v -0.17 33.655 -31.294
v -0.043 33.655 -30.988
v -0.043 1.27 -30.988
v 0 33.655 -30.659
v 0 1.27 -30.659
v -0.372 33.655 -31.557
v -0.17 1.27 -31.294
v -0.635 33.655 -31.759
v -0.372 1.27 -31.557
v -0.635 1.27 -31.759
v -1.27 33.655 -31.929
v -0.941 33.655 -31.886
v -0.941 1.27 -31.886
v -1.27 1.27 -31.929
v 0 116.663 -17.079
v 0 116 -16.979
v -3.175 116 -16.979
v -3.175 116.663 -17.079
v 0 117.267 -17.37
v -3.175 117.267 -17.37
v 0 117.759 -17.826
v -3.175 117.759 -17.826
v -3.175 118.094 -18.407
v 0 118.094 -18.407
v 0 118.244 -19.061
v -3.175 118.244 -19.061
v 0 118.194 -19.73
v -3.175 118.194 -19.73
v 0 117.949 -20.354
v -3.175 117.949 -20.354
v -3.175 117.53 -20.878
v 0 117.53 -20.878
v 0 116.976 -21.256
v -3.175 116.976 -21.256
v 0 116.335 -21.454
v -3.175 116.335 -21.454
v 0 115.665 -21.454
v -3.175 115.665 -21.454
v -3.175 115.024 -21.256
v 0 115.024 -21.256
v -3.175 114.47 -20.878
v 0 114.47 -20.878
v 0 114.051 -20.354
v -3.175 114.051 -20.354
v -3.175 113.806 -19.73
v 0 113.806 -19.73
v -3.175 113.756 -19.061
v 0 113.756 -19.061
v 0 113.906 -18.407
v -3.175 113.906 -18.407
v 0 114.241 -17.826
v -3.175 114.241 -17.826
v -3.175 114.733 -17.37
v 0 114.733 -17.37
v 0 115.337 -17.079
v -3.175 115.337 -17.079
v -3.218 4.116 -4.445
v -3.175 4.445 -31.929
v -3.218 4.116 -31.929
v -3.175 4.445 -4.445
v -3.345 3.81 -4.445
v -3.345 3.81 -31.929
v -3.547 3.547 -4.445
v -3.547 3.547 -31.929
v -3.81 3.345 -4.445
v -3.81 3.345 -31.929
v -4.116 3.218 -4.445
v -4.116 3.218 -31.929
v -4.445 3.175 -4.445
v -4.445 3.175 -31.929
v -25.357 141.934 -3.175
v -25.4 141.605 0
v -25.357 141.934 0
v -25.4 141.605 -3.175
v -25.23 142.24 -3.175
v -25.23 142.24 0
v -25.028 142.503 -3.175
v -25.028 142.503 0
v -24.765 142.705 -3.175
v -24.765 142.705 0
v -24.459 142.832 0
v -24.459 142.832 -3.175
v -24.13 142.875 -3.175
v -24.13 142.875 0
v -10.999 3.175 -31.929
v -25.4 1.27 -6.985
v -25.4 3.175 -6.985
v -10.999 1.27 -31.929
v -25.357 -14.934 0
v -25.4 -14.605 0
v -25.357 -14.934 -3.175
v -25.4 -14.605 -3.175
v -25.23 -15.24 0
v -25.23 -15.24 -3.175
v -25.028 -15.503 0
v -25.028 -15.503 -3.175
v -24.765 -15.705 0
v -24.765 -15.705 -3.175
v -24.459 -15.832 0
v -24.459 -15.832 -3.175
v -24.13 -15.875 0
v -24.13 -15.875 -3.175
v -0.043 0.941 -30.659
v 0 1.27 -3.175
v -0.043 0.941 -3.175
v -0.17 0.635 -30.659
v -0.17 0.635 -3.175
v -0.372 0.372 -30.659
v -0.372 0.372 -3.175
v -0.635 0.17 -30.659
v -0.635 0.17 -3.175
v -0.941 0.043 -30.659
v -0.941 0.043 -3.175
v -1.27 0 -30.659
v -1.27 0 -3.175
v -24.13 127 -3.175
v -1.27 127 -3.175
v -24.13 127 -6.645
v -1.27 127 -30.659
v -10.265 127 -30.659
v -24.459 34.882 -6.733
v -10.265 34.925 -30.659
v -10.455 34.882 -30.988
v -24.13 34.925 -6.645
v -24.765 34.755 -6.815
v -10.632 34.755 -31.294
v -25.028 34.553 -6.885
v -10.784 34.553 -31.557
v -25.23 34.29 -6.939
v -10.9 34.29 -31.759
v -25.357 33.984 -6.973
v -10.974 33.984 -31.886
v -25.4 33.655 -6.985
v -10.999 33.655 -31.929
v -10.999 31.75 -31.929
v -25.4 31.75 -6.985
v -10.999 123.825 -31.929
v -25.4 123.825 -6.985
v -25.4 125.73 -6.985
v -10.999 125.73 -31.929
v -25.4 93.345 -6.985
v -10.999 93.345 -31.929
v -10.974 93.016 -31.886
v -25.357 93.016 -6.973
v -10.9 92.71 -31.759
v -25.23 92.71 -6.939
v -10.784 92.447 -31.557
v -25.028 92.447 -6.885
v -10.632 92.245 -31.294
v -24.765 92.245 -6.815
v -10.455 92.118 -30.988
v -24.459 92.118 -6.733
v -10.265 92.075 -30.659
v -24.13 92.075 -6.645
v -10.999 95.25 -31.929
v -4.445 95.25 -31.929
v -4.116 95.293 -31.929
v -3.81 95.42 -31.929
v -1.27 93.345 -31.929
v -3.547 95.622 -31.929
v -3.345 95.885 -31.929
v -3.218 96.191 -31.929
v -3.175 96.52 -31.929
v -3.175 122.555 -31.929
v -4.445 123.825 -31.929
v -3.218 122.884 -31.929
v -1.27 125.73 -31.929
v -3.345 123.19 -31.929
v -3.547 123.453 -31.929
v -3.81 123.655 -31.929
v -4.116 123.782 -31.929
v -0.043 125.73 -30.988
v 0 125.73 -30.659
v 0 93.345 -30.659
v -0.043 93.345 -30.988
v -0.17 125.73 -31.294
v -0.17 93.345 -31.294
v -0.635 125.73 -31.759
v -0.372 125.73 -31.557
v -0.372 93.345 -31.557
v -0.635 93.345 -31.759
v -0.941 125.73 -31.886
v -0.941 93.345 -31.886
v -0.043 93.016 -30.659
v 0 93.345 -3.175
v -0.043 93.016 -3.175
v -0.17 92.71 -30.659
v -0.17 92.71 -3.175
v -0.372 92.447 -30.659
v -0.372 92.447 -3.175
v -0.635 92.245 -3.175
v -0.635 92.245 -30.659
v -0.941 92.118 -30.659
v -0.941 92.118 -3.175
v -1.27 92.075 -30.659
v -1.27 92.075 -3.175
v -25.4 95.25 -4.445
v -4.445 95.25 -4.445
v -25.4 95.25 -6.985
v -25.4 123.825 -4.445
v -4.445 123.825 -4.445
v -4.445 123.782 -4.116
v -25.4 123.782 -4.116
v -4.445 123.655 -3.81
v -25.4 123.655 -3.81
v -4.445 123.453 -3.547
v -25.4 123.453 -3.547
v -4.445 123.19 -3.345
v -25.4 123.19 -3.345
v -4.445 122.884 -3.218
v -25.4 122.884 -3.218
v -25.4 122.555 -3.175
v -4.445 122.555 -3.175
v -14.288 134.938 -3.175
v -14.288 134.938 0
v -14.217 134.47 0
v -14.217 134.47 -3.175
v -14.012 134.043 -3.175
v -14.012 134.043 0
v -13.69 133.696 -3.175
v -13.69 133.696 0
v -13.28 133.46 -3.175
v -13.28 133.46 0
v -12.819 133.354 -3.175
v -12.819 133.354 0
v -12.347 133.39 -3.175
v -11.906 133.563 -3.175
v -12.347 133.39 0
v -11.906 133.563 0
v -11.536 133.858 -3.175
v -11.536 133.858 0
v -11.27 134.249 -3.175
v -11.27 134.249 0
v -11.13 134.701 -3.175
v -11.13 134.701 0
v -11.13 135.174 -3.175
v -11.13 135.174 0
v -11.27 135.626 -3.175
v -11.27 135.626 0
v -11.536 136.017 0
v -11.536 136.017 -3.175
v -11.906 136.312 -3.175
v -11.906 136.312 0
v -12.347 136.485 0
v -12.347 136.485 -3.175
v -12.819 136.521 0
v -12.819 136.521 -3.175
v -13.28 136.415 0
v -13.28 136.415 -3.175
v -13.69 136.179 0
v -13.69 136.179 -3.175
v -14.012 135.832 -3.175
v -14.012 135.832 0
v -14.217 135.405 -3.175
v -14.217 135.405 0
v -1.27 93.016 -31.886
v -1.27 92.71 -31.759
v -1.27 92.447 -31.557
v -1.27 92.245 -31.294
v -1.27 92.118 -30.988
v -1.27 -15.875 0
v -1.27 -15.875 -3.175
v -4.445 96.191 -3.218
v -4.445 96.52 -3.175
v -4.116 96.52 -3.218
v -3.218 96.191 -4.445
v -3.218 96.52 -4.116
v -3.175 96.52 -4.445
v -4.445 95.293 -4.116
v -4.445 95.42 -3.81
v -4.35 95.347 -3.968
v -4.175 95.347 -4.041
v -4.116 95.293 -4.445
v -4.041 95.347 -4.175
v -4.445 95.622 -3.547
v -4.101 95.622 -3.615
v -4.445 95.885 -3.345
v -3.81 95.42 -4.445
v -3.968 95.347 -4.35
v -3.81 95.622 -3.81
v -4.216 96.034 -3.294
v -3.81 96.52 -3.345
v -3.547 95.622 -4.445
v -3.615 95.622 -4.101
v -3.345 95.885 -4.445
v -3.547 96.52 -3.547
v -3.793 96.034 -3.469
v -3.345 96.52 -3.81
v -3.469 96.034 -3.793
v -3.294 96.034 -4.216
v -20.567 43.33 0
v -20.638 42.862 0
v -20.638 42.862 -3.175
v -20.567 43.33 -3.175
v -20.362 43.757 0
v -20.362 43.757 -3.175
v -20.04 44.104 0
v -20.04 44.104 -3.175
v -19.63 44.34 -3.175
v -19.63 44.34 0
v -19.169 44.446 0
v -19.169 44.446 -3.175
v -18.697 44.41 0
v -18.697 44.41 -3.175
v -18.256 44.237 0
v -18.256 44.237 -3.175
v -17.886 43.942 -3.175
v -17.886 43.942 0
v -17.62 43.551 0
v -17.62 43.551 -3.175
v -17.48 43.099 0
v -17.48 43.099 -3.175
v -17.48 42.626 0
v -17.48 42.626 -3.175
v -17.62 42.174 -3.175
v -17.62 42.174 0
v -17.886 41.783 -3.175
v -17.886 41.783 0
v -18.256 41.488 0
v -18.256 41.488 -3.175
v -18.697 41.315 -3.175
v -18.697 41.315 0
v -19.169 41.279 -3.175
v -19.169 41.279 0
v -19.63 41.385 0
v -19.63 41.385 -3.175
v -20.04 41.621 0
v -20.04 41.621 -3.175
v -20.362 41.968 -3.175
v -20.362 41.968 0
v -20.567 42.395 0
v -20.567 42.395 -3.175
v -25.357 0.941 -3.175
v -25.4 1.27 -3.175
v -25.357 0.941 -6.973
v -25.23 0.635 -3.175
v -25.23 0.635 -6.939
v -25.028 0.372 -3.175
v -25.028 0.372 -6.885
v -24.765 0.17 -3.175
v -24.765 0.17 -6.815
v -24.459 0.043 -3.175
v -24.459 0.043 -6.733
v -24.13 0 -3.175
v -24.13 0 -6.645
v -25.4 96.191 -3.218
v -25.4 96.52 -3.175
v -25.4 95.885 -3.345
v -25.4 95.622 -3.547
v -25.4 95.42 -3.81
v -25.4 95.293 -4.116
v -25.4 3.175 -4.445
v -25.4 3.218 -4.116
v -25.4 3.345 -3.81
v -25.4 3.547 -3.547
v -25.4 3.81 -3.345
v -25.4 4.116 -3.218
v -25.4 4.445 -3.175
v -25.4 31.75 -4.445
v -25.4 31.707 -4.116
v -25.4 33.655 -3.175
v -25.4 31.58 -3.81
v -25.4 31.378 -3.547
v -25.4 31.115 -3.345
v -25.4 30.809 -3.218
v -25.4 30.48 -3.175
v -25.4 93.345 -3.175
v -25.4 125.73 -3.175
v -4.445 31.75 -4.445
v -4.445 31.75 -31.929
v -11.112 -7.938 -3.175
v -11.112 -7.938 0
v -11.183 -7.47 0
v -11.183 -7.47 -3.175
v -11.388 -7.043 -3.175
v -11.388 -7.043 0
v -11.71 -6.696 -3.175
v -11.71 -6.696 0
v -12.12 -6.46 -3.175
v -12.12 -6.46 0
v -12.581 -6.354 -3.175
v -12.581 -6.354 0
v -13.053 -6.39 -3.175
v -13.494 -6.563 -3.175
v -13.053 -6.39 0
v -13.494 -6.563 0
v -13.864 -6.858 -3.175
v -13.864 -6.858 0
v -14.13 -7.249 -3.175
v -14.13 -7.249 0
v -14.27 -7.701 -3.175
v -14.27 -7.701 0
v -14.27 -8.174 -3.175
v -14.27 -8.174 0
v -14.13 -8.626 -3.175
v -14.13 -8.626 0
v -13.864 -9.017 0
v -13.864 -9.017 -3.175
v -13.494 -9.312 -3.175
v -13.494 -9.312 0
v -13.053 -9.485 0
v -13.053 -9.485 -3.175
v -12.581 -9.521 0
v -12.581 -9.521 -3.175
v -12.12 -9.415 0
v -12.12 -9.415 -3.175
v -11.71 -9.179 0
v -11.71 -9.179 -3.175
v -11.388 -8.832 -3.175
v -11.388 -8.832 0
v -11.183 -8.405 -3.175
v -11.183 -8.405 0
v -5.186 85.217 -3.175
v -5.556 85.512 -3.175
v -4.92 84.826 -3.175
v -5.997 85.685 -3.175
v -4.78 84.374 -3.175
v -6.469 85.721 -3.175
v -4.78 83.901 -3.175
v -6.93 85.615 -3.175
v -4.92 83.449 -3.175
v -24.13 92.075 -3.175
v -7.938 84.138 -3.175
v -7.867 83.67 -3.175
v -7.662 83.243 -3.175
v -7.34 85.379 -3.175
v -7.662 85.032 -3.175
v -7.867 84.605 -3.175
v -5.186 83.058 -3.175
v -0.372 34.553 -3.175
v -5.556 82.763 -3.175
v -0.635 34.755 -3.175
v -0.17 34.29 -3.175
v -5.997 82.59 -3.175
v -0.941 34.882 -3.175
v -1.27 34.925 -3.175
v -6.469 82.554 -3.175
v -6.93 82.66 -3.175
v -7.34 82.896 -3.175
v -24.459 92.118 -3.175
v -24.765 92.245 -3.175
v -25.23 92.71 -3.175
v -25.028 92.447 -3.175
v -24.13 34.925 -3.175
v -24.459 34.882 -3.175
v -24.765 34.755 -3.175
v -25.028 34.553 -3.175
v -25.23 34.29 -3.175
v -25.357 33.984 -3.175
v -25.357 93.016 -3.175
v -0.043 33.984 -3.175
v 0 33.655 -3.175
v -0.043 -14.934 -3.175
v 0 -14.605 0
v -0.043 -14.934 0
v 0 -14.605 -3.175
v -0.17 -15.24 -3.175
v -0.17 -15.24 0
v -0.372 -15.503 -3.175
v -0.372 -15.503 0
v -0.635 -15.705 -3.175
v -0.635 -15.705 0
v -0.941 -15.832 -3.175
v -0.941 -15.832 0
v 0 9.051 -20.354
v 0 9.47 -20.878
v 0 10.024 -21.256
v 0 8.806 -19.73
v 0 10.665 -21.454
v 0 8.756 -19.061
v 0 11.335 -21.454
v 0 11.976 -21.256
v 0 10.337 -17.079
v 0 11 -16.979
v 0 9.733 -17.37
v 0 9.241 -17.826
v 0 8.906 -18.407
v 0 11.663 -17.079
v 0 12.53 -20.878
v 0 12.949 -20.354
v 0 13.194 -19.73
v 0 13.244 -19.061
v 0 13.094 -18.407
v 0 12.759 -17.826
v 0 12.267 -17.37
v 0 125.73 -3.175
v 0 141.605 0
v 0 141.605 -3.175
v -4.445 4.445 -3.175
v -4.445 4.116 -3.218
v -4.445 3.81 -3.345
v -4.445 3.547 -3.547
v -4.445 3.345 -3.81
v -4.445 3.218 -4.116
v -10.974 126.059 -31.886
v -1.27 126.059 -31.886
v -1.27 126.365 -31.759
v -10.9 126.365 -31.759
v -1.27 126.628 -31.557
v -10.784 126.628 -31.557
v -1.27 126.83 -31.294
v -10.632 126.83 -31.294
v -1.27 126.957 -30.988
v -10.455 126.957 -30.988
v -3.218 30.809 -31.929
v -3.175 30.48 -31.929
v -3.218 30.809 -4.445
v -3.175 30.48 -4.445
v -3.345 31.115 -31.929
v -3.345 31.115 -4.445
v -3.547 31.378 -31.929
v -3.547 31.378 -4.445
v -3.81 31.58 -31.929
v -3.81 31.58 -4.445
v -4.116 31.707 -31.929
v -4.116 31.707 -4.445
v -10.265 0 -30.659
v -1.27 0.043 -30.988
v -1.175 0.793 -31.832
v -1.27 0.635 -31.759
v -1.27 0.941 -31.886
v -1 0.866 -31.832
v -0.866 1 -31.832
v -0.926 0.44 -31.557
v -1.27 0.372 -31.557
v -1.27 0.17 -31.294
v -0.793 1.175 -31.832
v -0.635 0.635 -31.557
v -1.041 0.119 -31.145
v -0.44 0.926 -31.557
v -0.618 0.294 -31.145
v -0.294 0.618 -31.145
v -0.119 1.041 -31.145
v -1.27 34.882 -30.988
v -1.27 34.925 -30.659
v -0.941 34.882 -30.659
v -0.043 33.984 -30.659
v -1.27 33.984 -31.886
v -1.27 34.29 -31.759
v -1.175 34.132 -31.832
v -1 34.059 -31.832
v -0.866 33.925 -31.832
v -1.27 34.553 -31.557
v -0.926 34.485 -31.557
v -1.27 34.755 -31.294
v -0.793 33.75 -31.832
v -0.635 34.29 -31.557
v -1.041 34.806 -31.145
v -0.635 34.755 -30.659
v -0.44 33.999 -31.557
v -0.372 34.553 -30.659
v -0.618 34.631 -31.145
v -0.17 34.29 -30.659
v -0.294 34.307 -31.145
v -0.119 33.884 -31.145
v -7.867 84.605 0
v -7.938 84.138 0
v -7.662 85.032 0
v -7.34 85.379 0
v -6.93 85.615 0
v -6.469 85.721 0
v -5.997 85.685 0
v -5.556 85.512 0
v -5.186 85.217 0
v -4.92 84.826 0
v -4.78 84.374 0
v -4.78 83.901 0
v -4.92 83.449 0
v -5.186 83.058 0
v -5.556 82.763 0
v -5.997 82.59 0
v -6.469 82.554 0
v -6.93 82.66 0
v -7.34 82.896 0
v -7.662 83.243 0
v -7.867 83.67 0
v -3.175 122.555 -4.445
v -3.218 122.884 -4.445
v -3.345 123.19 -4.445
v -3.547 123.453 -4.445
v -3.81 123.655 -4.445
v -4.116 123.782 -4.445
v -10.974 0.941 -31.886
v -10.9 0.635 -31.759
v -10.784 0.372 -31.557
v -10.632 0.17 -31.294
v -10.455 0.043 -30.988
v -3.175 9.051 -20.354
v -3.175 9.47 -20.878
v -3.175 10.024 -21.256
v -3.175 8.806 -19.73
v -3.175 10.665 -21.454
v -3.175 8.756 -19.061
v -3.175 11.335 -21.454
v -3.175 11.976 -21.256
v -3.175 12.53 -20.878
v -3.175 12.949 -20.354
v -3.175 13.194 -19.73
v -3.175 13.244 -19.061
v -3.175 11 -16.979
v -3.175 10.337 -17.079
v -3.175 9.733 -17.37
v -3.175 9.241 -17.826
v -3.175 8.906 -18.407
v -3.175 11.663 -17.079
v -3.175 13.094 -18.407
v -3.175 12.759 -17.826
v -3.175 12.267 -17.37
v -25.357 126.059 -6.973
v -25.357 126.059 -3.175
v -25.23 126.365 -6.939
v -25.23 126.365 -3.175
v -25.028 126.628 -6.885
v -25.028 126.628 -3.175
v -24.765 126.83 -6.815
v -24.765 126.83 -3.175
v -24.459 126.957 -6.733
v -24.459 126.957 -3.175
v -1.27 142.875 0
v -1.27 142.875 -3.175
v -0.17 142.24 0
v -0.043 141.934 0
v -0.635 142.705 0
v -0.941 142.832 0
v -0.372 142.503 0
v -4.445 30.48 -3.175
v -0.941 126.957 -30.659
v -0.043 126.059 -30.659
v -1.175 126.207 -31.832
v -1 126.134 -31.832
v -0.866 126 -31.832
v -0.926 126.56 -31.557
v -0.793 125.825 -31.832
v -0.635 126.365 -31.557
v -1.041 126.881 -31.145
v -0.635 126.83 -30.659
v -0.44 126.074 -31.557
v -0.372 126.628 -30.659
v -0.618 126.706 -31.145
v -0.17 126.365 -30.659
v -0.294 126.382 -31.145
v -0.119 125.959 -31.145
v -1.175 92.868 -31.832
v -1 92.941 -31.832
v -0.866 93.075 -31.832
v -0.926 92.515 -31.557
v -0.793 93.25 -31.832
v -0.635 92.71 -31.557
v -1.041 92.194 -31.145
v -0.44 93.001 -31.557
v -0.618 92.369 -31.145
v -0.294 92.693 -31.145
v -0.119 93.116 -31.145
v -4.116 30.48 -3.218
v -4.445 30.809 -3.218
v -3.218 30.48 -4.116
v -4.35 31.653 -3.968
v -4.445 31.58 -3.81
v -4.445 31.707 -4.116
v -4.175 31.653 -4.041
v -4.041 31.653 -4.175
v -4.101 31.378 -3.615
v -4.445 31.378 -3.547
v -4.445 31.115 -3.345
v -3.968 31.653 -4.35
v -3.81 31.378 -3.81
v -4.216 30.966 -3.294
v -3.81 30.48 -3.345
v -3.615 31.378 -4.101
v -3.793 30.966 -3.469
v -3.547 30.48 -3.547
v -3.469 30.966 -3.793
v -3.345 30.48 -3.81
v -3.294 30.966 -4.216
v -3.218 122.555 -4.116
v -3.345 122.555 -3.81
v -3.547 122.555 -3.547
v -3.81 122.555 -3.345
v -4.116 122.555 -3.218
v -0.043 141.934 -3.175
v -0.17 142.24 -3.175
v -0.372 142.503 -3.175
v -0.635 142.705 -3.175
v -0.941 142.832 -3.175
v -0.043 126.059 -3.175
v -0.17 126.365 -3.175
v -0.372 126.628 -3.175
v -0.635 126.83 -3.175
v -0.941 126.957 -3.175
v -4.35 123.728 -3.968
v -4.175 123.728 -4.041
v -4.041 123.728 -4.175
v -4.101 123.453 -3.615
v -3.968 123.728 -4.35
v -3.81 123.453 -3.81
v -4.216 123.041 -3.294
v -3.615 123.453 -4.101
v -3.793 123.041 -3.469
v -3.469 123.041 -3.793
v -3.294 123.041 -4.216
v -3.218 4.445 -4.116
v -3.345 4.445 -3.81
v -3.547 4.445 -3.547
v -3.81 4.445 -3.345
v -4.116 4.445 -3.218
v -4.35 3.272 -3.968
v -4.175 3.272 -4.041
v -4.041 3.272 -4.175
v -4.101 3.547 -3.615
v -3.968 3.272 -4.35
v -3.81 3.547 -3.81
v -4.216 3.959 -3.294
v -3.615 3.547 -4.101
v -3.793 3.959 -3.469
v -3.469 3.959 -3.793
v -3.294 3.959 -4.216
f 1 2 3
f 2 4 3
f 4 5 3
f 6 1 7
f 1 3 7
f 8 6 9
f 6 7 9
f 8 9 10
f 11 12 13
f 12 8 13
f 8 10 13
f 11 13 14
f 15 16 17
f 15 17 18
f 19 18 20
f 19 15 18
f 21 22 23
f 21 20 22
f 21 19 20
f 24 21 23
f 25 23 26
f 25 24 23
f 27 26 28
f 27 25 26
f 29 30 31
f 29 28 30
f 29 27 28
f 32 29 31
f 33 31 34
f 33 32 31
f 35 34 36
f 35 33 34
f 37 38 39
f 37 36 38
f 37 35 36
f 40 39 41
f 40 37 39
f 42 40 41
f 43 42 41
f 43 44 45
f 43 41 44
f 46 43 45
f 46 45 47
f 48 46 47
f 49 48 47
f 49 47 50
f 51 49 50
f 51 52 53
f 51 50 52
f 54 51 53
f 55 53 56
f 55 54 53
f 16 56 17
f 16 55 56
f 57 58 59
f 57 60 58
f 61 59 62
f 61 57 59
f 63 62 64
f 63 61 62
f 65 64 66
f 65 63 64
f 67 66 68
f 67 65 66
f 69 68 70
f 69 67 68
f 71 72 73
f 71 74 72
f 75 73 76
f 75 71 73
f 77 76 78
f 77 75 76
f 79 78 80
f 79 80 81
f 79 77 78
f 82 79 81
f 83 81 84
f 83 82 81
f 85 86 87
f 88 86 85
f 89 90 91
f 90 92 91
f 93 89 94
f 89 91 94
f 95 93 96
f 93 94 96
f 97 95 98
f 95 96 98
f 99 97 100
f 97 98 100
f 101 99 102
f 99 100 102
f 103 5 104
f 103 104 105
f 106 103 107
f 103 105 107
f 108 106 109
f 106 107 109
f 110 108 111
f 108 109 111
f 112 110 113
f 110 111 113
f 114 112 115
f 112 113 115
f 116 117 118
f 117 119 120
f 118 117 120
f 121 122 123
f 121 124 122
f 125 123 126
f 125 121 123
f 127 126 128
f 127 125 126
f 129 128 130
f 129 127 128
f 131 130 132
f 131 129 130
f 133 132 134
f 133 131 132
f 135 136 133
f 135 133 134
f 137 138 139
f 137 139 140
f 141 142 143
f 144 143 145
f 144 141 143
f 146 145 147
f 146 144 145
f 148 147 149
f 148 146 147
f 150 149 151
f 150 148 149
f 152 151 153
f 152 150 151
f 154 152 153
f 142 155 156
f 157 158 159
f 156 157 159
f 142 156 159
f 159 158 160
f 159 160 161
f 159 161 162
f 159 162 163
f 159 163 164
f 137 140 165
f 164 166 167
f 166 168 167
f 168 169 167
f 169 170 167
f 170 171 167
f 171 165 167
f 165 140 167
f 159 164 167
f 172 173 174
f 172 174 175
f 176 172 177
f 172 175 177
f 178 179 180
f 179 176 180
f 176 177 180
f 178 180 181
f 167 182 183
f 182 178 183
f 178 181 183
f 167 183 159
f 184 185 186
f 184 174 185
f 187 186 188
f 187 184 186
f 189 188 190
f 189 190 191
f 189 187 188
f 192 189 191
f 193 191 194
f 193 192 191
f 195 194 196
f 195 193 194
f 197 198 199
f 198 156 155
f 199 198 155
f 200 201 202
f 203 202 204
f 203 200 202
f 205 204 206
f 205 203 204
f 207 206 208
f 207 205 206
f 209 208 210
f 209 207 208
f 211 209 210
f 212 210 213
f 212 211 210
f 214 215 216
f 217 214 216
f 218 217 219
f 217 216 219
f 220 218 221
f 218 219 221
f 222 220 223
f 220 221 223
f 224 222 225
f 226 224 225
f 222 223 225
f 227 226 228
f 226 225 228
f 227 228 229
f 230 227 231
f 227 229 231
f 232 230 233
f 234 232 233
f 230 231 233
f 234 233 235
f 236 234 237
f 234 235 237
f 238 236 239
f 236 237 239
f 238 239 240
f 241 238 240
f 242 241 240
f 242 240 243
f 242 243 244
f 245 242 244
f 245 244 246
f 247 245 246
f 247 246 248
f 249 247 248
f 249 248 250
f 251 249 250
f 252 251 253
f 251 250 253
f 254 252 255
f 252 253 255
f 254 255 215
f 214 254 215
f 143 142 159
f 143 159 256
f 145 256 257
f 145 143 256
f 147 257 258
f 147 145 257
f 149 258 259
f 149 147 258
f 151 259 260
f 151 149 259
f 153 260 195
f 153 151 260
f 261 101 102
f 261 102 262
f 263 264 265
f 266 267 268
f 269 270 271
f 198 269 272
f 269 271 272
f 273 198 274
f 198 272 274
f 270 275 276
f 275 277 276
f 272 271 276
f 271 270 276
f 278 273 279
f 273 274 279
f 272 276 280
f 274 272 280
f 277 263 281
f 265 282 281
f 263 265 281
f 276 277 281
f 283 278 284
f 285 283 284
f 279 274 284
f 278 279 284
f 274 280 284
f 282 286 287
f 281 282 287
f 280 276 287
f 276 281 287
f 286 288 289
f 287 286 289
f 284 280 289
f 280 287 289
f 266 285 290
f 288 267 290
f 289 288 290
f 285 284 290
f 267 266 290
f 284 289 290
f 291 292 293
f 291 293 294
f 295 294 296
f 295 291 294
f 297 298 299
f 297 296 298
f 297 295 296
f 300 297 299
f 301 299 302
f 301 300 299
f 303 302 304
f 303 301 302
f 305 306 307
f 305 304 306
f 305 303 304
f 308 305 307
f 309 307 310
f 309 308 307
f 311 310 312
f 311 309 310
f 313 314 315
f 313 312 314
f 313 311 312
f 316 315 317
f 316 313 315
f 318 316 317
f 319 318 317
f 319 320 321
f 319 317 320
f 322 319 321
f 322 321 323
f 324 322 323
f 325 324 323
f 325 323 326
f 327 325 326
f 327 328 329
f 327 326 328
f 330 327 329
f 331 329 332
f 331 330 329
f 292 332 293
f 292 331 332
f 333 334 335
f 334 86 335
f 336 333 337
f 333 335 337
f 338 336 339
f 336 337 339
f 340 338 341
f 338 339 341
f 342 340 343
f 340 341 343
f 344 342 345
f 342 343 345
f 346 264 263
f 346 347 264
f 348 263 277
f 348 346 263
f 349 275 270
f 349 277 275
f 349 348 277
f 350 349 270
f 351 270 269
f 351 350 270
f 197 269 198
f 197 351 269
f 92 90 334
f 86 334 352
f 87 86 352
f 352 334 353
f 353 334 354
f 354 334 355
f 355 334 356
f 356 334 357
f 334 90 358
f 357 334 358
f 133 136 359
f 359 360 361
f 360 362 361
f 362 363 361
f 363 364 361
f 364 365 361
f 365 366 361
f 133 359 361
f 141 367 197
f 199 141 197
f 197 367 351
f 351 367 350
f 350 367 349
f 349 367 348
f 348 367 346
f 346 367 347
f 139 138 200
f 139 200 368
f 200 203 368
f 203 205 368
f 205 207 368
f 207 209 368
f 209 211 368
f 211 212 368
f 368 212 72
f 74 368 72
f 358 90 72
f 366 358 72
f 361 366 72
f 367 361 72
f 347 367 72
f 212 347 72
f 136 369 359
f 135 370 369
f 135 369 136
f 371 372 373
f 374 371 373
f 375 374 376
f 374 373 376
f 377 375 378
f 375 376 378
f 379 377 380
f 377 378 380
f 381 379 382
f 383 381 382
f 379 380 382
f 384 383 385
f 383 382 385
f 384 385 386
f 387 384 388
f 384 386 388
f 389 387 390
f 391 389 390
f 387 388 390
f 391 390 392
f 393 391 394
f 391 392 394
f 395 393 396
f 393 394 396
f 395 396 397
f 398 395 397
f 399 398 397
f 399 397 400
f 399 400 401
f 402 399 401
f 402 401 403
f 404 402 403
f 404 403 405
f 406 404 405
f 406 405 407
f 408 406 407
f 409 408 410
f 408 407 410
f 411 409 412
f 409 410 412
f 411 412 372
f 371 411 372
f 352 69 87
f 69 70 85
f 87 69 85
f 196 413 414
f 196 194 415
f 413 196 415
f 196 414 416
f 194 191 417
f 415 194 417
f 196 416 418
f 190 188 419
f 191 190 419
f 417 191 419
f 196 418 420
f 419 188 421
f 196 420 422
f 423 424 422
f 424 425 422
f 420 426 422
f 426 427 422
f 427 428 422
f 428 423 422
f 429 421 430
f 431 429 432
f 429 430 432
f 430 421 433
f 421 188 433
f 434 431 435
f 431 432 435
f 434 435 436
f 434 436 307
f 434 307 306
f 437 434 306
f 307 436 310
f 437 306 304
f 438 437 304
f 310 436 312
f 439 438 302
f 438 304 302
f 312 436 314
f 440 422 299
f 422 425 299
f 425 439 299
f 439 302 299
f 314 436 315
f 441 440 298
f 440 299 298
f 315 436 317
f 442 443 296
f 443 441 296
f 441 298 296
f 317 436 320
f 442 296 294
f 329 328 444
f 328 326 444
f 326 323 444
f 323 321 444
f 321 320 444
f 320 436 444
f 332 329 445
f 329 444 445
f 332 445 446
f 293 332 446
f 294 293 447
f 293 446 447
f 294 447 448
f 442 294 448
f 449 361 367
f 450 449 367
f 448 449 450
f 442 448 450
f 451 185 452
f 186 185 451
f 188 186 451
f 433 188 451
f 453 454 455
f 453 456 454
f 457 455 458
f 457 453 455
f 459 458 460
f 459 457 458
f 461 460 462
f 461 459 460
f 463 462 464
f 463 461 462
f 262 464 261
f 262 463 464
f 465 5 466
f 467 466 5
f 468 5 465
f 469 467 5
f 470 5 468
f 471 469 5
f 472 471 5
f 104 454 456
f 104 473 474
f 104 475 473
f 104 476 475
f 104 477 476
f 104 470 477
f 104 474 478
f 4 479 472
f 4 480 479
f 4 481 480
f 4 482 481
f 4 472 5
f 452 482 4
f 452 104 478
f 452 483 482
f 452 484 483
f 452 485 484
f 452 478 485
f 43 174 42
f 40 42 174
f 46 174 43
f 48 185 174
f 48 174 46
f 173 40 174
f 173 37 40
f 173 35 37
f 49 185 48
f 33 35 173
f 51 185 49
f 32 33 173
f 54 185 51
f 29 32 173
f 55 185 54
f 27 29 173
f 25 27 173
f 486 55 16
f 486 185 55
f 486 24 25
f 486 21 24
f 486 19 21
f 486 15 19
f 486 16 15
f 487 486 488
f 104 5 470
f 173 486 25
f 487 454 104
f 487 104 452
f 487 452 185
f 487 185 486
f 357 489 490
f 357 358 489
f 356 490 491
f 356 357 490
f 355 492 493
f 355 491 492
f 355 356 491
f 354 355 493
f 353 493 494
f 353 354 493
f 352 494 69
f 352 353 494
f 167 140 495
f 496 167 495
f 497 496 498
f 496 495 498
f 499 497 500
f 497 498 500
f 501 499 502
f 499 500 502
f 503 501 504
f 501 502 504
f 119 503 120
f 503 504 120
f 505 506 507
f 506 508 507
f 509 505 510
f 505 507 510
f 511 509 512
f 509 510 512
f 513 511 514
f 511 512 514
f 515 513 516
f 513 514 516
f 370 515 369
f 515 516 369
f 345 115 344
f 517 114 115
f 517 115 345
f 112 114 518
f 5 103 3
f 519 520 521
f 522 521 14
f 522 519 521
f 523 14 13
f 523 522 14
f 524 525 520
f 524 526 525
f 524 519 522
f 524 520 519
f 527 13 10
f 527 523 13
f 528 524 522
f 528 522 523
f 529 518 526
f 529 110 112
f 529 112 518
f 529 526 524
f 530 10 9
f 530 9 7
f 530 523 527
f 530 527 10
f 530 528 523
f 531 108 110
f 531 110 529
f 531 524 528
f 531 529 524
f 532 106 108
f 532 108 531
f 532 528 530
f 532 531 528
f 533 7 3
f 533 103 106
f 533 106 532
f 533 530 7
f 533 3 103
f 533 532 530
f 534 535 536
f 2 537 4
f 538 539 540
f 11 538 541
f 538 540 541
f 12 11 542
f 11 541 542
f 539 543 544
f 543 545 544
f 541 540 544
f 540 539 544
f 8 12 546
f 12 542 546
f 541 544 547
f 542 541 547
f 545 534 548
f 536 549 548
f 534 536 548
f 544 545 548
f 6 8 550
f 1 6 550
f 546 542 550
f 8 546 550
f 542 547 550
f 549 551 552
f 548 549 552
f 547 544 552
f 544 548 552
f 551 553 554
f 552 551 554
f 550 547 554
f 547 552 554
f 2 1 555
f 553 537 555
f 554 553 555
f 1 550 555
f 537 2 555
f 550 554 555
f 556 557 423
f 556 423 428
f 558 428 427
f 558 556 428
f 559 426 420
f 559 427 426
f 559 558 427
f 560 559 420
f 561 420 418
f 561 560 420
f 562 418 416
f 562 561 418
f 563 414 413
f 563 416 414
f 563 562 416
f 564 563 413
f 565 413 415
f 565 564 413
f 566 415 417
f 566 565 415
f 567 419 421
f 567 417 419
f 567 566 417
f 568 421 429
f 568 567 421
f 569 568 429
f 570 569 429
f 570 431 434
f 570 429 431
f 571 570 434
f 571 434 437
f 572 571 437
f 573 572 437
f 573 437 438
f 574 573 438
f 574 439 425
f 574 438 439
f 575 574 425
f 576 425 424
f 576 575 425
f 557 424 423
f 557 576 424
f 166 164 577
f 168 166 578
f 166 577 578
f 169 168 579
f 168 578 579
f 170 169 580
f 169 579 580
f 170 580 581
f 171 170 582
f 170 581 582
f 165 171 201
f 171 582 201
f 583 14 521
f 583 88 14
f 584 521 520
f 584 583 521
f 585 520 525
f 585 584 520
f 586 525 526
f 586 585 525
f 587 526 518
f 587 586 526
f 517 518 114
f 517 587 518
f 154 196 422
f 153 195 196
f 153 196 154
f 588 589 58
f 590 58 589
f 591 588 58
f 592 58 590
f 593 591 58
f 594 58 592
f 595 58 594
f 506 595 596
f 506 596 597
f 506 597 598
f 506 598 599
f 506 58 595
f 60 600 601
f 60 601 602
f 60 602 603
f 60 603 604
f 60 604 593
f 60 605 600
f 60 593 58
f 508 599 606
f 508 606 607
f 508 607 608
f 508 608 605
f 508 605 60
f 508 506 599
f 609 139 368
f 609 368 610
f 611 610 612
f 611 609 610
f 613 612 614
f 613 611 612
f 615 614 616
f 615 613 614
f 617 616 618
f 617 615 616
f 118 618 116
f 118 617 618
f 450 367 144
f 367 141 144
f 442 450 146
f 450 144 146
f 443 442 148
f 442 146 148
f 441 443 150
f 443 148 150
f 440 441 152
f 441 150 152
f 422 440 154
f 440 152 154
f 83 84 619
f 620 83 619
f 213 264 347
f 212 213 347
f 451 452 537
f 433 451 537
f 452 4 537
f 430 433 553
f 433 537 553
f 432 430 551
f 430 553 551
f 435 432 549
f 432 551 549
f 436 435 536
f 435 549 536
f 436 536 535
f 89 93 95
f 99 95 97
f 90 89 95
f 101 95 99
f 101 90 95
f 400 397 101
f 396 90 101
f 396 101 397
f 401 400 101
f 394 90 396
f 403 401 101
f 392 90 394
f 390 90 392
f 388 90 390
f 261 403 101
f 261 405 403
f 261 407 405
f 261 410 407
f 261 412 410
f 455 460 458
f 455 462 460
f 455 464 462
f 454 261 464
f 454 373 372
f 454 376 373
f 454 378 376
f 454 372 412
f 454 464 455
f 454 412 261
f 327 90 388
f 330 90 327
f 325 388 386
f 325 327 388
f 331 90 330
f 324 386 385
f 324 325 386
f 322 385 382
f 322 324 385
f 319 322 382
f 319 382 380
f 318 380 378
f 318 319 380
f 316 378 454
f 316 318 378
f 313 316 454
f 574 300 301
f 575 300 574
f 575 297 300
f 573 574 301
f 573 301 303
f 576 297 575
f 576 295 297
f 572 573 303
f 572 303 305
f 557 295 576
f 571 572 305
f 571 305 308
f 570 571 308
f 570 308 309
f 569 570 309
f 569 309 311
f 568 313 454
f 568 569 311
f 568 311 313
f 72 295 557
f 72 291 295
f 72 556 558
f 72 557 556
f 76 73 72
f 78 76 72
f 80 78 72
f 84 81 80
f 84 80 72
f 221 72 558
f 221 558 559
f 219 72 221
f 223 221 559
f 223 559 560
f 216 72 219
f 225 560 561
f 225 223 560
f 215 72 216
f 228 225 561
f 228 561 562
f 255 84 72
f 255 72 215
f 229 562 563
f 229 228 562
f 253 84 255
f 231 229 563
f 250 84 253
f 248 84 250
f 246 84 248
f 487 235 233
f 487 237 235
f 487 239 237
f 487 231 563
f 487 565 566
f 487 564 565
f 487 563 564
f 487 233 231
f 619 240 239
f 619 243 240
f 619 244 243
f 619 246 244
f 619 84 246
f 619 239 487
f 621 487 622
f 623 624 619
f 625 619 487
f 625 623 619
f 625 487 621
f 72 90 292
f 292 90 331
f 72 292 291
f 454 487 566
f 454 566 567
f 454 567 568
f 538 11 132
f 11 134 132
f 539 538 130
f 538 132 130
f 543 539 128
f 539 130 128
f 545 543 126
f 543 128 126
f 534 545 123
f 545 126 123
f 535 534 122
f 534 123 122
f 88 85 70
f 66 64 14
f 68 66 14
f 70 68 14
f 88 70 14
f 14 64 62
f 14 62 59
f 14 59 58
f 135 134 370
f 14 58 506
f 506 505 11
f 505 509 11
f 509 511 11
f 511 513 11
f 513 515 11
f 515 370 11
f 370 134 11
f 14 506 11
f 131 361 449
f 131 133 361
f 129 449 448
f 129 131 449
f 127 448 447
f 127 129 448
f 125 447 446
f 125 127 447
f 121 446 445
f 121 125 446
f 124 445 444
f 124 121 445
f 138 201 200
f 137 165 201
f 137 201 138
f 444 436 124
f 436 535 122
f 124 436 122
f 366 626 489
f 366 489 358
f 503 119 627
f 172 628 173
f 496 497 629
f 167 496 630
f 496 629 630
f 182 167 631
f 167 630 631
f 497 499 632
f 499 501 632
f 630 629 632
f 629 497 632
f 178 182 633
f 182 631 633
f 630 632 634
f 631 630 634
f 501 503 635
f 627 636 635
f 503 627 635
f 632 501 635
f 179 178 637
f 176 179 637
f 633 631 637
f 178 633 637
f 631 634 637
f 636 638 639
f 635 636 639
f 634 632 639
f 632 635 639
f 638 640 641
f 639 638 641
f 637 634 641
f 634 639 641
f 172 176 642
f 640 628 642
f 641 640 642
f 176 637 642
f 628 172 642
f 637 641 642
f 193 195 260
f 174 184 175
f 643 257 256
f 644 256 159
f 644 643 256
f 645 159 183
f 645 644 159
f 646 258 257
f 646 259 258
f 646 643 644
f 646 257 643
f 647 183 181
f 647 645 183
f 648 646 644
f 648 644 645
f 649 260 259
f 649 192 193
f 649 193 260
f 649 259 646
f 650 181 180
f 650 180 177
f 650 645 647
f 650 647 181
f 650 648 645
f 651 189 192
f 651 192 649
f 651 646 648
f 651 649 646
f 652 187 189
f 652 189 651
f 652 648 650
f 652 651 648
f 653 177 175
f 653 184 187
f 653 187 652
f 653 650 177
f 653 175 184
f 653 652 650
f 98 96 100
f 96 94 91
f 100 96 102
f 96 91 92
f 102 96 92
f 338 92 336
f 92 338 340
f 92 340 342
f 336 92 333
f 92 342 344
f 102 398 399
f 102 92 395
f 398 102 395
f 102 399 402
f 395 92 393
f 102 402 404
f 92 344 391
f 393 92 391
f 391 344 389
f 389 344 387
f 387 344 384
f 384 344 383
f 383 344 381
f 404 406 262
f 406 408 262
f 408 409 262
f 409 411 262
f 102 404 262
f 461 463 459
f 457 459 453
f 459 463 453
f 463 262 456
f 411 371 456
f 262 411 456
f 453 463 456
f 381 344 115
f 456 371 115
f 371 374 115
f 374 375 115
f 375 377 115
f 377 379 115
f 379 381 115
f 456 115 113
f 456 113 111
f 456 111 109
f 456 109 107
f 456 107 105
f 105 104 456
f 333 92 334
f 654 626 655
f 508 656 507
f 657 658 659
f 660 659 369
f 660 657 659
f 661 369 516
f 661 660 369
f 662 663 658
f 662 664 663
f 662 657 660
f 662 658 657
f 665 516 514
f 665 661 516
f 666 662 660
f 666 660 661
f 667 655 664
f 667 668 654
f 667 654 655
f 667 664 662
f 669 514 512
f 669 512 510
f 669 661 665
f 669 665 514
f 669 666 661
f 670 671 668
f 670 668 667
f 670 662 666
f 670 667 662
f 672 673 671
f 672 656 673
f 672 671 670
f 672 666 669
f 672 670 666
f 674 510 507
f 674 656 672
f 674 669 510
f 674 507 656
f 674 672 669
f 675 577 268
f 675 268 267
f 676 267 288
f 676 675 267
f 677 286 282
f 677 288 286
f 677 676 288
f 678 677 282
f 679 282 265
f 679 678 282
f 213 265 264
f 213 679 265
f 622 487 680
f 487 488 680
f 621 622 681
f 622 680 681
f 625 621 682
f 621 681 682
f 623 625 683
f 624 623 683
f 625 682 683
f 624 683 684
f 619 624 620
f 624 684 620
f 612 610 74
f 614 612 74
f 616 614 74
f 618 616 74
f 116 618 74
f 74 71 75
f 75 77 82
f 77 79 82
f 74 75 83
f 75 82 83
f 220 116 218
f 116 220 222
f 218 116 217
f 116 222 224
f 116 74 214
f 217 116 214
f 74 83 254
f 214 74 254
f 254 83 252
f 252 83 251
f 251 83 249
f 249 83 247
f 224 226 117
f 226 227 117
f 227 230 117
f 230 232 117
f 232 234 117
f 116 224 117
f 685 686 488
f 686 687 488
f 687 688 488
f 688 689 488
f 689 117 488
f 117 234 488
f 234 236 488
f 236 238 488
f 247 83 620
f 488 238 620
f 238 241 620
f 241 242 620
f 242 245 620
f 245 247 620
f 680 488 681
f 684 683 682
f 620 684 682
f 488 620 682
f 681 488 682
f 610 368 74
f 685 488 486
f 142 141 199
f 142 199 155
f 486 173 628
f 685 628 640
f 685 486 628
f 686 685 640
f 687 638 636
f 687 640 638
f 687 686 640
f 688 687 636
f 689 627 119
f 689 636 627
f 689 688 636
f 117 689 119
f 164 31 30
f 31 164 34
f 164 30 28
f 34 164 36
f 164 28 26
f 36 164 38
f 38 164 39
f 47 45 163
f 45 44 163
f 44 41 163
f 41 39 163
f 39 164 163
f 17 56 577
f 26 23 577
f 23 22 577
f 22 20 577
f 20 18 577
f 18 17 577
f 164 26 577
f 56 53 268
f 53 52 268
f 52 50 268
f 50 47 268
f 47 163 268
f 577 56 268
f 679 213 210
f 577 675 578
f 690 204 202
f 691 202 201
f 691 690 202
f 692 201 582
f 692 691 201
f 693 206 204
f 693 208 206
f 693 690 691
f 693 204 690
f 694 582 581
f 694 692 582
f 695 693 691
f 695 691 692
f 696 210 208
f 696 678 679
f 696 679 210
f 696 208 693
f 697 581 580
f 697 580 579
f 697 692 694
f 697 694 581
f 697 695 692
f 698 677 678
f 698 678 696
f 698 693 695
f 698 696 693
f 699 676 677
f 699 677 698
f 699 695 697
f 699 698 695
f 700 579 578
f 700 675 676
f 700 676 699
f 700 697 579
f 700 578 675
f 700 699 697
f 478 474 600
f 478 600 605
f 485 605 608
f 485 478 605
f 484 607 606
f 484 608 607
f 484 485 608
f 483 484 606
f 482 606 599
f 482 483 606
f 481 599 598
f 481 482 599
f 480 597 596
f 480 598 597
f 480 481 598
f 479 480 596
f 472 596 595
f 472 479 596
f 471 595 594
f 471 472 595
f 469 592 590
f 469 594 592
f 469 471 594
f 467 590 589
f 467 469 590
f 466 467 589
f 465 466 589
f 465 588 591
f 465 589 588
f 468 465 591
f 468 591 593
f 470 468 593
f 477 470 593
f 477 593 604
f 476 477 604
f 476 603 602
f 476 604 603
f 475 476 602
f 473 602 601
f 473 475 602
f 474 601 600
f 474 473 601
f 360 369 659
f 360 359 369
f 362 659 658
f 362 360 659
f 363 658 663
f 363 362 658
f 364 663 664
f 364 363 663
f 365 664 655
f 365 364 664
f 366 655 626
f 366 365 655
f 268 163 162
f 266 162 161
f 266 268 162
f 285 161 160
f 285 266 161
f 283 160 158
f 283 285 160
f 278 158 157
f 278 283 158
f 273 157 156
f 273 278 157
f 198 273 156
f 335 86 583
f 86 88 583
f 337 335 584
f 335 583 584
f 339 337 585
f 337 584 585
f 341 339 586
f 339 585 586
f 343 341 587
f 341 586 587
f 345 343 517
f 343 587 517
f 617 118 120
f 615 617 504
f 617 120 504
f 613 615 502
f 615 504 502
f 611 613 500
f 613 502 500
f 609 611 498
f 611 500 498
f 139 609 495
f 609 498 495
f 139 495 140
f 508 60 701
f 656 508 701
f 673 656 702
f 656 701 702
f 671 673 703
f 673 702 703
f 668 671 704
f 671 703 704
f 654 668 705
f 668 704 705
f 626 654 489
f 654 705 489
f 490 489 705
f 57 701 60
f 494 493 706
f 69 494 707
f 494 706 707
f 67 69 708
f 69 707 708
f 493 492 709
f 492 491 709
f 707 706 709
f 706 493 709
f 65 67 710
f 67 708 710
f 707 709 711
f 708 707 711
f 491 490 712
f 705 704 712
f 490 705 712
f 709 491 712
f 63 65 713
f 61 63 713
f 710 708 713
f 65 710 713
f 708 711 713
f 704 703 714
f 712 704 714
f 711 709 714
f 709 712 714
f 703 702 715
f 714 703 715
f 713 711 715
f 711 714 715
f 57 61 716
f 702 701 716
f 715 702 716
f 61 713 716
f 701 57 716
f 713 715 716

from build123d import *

# Parameters (mm, degrees)
BOSS_EXTRUDE1_DEPTH     = 127
CUT_EXTRUDE1_START      = -31.75
CUT_EXTRUDE1_DEPTH      = 28.575
CUT_EXTRUDE2_START      = 31.75
CUT_EXTRUDE2_DEPTH      = 28.575
SKETCH3_W               = 25.4
SKETCH3_H               = 50.8
CUT_EXTRUDE4_DEPTH      = 28.575
CUT_EXTRUDE7_DEPTH      = 140.18702407
CUT_EXTRUDE7_DEPTH_BACK = 140.18702407
CUT_EXTRUDE6_DEPTH      = 133.668601113
CUT_EXTRUDE6_DEPTH_BACK = 133.668601113
SKETCH5_R               = 1.5875
CUT_EXTRUDE9_DEPTH      = 133.824762172
CUT_EXTRUDE9_DEPTH_BACK = 133.824762172
SKETCH8_R               = 2.25
SKETCH9_W               = 25.4
SKETCH9_H               = 15.875
SKETCH9_R               = 1.5875
BOSS_EXTRUDE2_DEPTH     = 3.175
FILLET1_R               = 1.27


with BuildPart() as part:
    # Sketch1 → Boss-Extrude1 (new body)
    with BuildSketch(Plane(origin=(0, 0, 0), x_dir=(1, 0, 0), z_dir=(0, 1, 0))):
        Polygon((0, 0), (-25.4, 0), (-25.4, 6.985), (0, 50.979090512), align=None)
    extrude(amount=BOSS_EXTRUDE1_DEPTH)

    # Sketch2 → Cut-Extrude1 (cut)
    with BuildSketch(Plane(origin=(0, 63.5, 0), x_dir=(-1, 0, 0), z_dir=(0, -1, 0)).offset(CUT_EXTRUDE1_START)):
        Polygon((25.4, 6.985), (3.175, 45.479829198), (3.175, 3.175), (25.4, 3.175), align=None)
    extrude(amount=-CUT_EXTRUDE1_DEPTH, mode=Mode.SUBTRACT)

    # Sketch2<2> → Cut-Extrude2 (cut)
    with BuildSketch(Plane(origin=(0, 63.5, 0), x_dir=(-1, 0, 0), z_dir=(0, -1, 0)).offset(CUT_EXTRUDE2_START)):
        Polygon((25.4, 6.985), (3.175, 45.479829198), (3.175, 3.175), (25.4, 3.175), align=None)
    extrude(amount=CUT_EXTRUDE2_DEPTH, mode=Mode.SUBTRACT)

    # Sketch3 → Cut-Extrude4 (cut, symmetric)
    with BuildSketch(Plane(origin=(0, 63.5, 0), x_dir=(-1, 0, 0), z_dir=(0, -1, 0))):
        with Locations((12.7, 28.575)):
            Rectangle(SKETCH3_W, SKETCH3_H)
    extrude(amount=CUT_EXTRUDE4_DEPTH, both=True, mode=Mode.SUBTRACT)

    # Sketch6 → Cut-Extrude7 (cut, two sides: drawn at the far end of the back side and taken through both)
    with BuildSketch(Plane.XZ.offset(-CUT_EXTRUDE7_DEPTH_BACK)):
        Polygon((0, -31.929090512), (0, -50.979090512), (-10.998522628, -31.929090512), align=None)
    extrude(amount=CUT_EXTRUDE7_DEPTH + CUT_EXTRUDE7_DEPTH_BACK, mode=Mode.SUBTRACT)

    # Sketch5 → Cut-Extrude6 (cut, two sides: drawn at the far end of the back side and taken through both)
    with BuildSketch(Plane(origin=(0, 0, -3.175), x_dir=(-1, 0, 0), z_dir=(0, 0, -1)).offset(-CUT_EXTRUDE6_DEPTH_BACK)):
        with Locations((6.35, 84.1375)):
            Circle(SKETCH5_R)
        with Locations((19.05, 42.8625)):
            Circle(SKETCH5_R)
    extrude(amount=CUT_EXTRUDE6_DEPTH + CUT_EXTRUDE6_DEPTH_BACK, mode=Mode.SUBTRACT)

    # Sketch8 → Cut-Extrude9 (cut, two sides: drawn at the far end of the back side and taken through both)
    with BuildSketch(Plane.ZY.offset(3.175).offset(-CUT_EXTRUDE9_DEPTH_BACK)):
        with Locations((-19.229090512, 11)):
            Circle(SKETCH8_R)
        with Locations((-19.229090512, 116)):
            Circle(SKETCH8_R)
    extrude(amount=CUT_EXTRUDE9_DEPTH + CUT_EXTRUDE9_DEPTH_BACK, mode=Mode.SUBTRACT)

    # Sketch9 → Boss-Extrude2 (add)
    # profile 1 of 2: a face of its own
    with BuildSketch(Plane.XY):
        with Locations((-12.7, -7.9375)):
            Rectangle(SKETCH9_W, SKETCH9_H)
        with Locations((-12.7, -7.9375)):
            Circle(SKETCH9_R, mode=Mode.SUBTRACT)
    # profile 2 of 2: a face of its own
    with BuildSketch(Plane.XY):
        with Locations((-12.7, 134.9375)):
            Rectangle(SKETCH9_W, SKETCH9_H)
        with Locations(Location((-12.7, 134.9375, 0), (0, 0, 180))):
            Circle(SKETCH9_R, mode=Mode.SUBTRACT)
    extrude(amount=-BOSS_EXTRUDE2_DEPTH)

    # Fillet1
    fillet1_edges = [part.edges().sort_by_distance(p)[0] for p in [
        (0, 0, -17.552045256),
        (0, -15.875, -1.5875),
        (-25.4, -15.875, -1.5875),
        (-25.4, 127, -5.08),
        (0, 127, -17.552045256),
        (-25.4, 142.875, -1.5875),
        (0, 142.875, -1.5875),
        (-3.175, 109.5375, -3.175),
        (-14.2875, 95.25, -3.175),
        (-14.2875, 123.825, -3.175),
        (-3.175, 123.825, -17.552045256),
        (-3.175, 17.4625, -3.175),
        (-14.2875, 31.75, -3.175),
        (-14.2875, 3.175, -3.175),
        (-25.4, 92.075, -5.08),
        (-25.4, 34.925, -5.08),
        (-18.199261314, 34.925, -19.457045256),
        (-18.199261314, 92.075, -19.457045256),
        (-25.4, 0, -5.08),
        (0, 34.925, -17.552045256),
        (-5.499261314, 34.925, -31.929090512),
        (0, 92.075, -17.552045256),
        (-3.175, 3.175, -17.552045256),
        (-3.175, 31.75, -17.552045256),
        (-3.175, 95.25, -17.552045256),
        (-18.199261314, 0, -19.457045256),
        (-18.199261314, 127, -19.457045256),
        (-5.499261314, 0, -31.929090512),
        (-5.499261314, 127, -31.929090512),
        (-5.499261314, 92.075, -31.929090512),
        (0, 17.4625, -31.929090512),
        (0, 109.5375, -31.929090512),
    ]]
    fillet(fillet1_edges, radius=FILLET1_R)


solid = part.part
